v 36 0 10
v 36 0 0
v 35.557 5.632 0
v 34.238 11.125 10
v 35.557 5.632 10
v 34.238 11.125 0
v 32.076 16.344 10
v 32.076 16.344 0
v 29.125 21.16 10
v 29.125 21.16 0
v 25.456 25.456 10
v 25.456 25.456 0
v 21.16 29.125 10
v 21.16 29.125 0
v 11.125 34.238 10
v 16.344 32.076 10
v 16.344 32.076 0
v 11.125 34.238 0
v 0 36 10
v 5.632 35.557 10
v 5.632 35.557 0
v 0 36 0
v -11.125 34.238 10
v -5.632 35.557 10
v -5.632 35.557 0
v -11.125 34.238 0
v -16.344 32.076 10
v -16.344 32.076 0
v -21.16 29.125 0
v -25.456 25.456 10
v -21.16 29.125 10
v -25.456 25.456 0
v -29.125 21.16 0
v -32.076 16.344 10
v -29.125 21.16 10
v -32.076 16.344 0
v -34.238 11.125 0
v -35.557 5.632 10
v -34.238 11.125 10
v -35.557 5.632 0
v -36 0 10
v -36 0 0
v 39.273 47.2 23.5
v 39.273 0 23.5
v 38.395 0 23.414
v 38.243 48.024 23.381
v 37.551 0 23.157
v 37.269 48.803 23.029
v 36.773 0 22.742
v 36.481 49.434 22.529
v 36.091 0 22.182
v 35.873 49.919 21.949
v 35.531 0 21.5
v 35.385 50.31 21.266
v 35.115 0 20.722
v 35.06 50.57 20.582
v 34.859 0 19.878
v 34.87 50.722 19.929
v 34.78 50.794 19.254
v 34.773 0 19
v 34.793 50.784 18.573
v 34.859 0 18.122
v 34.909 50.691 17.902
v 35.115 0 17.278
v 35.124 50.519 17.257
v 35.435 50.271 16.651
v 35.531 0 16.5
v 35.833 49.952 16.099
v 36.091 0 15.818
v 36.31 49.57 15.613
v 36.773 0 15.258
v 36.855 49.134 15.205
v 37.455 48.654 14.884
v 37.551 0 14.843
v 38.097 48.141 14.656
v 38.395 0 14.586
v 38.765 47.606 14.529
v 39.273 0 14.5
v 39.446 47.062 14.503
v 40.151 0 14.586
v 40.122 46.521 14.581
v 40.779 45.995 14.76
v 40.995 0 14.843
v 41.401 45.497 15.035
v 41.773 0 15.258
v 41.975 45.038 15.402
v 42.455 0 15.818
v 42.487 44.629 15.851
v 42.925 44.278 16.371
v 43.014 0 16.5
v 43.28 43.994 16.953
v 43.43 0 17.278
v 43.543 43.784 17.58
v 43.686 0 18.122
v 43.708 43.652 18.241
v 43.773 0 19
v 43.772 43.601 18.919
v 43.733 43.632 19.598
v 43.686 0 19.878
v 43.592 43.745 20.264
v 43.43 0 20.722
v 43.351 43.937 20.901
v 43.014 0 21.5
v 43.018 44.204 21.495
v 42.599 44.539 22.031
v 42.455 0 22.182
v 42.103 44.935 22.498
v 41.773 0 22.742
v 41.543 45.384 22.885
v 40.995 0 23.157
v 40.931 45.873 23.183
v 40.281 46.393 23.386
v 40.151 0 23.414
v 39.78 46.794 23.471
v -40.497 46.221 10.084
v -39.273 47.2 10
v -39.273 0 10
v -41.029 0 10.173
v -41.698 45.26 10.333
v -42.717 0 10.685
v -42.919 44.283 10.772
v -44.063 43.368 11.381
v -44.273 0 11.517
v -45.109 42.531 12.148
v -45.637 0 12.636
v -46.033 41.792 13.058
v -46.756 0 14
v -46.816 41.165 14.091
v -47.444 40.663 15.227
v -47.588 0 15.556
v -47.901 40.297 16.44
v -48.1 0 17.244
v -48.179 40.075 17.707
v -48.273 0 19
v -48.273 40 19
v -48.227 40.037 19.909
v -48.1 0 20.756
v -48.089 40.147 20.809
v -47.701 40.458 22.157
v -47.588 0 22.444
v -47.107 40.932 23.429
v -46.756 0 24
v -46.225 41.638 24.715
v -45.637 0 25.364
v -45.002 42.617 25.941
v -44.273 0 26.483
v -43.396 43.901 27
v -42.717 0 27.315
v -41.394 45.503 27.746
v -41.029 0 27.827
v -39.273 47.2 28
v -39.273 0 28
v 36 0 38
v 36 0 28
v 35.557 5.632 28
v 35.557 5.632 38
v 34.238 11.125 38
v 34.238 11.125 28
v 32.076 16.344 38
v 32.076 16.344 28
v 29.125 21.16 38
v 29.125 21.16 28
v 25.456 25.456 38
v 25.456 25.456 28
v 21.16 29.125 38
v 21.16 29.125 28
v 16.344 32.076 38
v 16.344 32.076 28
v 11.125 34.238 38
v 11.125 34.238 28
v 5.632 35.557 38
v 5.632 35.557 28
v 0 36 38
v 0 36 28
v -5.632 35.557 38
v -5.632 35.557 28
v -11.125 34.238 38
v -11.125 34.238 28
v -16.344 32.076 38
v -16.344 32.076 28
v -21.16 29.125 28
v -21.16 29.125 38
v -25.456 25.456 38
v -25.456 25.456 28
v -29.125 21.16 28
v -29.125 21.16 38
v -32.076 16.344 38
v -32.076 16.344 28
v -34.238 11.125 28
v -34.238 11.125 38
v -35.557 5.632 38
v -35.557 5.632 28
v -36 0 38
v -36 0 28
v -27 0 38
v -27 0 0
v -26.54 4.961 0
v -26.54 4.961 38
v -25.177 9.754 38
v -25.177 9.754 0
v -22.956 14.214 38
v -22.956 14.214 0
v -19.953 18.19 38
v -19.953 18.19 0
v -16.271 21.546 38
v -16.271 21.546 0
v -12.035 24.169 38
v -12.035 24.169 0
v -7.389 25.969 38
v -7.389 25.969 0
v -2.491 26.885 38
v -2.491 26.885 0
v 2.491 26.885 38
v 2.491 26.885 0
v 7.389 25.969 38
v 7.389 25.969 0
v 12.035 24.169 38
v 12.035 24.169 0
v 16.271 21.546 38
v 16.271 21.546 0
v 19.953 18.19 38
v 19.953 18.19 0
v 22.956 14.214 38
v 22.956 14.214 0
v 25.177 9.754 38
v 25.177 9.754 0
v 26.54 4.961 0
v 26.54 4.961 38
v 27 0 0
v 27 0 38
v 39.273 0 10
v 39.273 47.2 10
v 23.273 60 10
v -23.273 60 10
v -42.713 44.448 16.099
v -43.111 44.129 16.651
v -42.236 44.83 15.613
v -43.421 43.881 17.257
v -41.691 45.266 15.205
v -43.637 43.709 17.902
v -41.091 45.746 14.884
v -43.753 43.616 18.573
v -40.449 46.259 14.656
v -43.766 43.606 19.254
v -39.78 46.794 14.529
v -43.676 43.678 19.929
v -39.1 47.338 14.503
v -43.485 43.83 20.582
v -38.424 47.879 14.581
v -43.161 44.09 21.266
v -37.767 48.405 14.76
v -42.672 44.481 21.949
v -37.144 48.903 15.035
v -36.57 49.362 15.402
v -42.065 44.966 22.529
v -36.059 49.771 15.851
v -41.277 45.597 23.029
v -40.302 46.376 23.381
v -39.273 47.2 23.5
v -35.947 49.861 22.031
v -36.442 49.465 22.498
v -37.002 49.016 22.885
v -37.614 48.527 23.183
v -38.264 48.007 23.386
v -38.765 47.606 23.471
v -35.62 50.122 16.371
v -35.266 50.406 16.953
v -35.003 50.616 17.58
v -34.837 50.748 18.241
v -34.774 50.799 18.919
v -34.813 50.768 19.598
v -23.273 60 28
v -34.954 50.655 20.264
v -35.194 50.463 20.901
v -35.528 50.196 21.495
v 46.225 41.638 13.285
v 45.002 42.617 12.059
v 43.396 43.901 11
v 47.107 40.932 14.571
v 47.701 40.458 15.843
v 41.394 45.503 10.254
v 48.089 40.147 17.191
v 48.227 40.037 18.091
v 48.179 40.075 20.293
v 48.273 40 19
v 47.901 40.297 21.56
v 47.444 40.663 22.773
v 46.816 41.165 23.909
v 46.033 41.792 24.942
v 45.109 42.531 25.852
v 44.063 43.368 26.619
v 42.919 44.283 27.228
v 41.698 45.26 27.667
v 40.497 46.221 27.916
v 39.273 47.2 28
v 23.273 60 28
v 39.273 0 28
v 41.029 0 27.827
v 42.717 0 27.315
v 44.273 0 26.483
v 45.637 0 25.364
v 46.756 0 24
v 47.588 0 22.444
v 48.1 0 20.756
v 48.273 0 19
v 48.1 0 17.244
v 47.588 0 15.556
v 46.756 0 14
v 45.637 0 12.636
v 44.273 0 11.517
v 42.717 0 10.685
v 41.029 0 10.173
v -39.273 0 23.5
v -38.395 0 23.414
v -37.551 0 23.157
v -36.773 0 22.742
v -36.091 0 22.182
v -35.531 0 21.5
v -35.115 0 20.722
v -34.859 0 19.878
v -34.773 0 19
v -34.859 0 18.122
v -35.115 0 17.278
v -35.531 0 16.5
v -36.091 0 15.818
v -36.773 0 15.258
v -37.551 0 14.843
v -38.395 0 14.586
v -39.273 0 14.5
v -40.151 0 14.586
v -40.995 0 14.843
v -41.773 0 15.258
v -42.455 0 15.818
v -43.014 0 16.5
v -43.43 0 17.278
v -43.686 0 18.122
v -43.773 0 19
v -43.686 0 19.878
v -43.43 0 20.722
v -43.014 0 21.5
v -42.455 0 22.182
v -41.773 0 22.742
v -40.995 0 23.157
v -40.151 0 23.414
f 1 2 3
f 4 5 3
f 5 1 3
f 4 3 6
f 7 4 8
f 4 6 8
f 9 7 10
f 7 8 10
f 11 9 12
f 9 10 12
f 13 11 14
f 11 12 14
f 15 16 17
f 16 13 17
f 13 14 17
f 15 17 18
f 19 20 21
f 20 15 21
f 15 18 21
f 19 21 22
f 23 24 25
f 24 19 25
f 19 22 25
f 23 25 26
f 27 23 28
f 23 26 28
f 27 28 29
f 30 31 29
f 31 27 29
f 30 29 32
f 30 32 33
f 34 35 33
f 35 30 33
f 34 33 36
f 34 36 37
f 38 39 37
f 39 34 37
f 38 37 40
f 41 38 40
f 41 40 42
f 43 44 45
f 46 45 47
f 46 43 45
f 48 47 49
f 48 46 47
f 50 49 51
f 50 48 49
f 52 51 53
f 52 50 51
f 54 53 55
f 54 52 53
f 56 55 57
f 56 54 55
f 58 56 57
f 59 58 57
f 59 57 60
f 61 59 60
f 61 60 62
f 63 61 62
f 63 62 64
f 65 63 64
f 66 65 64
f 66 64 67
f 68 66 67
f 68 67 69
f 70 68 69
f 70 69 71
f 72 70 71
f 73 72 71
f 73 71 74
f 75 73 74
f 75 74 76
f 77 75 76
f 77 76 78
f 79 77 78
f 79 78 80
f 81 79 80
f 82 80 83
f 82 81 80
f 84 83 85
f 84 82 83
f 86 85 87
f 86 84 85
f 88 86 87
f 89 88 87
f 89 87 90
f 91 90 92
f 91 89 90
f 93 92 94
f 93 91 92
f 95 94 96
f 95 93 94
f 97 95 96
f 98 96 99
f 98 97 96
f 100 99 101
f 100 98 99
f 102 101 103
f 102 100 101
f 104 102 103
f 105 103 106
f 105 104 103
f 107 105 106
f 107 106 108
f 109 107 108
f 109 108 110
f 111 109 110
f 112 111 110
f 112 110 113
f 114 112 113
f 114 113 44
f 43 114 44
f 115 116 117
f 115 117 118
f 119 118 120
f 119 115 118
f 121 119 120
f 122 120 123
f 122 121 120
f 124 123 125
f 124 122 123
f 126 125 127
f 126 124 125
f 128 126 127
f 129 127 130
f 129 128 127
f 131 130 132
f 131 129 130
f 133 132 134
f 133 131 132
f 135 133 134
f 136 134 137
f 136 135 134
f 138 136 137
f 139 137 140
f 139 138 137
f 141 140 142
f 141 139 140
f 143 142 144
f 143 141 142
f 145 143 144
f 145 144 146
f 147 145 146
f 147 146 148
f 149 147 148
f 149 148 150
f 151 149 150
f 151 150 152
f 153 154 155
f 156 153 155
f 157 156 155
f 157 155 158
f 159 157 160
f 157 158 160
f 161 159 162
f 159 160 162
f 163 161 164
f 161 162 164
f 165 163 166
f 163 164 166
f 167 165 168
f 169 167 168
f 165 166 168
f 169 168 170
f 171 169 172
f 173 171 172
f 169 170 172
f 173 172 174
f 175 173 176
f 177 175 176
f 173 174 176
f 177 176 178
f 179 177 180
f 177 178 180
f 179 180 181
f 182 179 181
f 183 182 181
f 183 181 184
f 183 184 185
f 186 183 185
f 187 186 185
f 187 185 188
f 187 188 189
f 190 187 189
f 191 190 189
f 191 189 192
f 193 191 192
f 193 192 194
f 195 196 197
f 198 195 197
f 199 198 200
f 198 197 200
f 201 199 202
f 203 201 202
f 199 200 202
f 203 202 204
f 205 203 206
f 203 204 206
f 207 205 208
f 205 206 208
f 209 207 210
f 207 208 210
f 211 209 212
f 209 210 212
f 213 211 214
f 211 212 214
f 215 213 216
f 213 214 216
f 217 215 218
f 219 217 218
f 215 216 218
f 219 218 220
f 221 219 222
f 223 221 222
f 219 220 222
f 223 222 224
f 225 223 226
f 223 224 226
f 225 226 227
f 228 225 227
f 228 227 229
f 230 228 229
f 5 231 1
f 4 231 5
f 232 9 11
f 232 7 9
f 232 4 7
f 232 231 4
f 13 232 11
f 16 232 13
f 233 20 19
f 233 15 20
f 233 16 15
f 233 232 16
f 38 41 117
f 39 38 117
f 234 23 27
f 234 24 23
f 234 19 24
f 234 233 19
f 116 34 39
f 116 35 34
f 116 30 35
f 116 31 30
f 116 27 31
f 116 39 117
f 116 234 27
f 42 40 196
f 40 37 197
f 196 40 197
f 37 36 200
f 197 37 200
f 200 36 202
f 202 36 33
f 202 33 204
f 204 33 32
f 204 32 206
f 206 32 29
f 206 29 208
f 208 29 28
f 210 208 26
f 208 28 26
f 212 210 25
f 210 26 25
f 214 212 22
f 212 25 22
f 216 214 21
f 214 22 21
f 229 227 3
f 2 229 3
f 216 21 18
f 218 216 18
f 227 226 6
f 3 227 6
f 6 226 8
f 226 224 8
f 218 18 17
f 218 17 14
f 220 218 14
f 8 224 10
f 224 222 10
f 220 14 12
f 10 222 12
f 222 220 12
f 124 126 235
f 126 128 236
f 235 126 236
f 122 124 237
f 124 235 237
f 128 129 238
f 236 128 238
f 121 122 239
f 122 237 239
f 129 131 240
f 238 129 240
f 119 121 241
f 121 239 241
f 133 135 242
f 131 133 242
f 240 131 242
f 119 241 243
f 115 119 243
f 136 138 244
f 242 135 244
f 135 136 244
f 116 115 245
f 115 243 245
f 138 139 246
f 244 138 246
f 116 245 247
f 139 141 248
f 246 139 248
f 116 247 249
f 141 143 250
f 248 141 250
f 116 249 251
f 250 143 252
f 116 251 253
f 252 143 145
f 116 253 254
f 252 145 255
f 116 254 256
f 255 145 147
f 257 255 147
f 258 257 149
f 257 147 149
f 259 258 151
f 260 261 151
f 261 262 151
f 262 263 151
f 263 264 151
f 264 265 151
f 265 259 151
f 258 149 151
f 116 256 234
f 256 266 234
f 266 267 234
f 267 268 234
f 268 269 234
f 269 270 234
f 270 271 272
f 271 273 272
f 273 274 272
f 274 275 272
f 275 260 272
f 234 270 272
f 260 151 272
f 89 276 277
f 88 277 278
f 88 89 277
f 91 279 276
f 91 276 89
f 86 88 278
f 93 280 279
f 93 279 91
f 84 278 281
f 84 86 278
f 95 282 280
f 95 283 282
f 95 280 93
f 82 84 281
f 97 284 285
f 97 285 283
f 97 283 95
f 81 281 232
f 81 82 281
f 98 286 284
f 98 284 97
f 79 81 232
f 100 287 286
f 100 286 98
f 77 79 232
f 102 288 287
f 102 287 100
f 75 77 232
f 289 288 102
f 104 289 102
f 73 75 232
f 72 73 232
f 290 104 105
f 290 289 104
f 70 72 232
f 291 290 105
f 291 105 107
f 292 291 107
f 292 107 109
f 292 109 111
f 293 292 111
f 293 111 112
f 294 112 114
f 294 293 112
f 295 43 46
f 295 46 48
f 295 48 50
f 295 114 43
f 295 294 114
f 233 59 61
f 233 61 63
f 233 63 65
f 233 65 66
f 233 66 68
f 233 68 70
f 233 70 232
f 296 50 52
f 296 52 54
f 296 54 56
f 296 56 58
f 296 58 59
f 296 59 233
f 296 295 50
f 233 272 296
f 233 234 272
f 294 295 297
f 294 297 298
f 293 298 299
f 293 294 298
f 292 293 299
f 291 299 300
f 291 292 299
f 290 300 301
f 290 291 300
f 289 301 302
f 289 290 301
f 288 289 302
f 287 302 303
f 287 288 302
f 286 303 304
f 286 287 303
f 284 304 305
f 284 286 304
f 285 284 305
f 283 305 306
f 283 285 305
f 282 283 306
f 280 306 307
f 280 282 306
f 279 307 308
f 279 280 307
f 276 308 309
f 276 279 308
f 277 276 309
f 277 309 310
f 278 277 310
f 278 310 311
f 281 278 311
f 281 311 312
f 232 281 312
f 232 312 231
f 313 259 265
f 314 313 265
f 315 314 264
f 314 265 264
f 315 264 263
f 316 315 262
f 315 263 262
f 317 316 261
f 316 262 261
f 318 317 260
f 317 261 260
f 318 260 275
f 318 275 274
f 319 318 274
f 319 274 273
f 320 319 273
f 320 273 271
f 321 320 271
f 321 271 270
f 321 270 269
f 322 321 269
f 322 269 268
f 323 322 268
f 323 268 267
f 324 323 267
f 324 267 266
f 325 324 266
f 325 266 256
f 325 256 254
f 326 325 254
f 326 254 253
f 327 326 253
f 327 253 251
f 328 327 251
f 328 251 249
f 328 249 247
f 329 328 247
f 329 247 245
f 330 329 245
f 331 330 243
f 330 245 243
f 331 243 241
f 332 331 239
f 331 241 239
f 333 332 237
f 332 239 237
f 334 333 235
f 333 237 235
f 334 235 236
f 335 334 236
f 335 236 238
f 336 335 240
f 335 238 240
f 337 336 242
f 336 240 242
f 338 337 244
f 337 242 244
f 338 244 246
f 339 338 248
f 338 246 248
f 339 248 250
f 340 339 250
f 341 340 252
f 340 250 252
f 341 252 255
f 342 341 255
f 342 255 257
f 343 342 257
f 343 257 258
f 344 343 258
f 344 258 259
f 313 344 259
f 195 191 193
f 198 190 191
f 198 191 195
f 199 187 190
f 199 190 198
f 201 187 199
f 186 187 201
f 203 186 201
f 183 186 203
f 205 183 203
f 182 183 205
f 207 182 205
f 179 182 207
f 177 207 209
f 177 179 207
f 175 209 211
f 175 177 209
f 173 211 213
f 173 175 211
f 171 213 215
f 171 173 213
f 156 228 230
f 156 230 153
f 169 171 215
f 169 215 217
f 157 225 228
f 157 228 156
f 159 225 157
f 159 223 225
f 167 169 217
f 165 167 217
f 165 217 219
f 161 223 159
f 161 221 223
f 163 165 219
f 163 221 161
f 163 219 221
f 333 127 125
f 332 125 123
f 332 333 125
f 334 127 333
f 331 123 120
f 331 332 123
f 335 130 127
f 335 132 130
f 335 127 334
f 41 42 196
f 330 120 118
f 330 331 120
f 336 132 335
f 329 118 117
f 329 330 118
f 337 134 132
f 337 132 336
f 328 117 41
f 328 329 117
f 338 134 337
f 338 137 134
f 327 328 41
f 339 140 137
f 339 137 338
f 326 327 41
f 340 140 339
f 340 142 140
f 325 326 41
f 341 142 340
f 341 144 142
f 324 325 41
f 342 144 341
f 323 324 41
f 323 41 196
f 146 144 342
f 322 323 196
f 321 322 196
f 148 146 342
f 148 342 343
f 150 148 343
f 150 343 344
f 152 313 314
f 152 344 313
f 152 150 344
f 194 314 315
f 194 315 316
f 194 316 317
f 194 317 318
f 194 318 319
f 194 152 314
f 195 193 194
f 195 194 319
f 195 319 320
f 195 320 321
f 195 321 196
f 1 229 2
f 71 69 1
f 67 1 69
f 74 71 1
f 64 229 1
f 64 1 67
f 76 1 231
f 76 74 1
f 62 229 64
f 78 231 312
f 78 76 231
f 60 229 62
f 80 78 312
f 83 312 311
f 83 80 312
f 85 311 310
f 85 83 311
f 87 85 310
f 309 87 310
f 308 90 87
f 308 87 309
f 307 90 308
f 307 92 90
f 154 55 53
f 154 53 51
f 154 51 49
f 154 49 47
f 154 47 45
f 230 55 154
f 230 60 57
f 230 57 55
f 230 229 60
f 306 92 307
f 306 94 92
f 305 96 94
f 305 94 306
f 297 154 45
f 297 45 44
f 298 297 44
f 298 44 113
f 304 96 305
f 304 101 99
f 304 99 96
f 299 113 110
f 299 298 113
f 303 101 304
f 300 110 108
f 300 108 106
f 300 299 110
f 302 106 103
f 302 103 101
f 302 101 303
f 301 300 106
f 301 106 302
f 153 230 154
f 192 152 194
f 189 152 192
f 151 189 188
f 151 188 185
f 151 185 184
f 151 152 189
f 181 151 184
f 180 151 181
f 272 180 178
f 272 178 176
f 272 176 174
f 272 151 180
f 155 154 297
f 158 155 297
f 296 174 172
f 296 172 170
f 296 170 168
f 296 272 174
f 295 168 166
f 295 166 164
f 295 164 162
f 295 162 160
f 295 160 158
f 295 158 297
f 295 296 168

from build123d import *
from build123d.topology import SkipClean

# Parameters (mm, degrees)
BOSS_EXTRUDE1_DEPTH = 38
BOSS_EXTRUDE2_REACH = 81.624
CUT_EXTRUDE1_START  = -38
SKETCH3_R           = 27
CUT_EXTRUDE1_DEPTH  = 38
SKETCH4_R           = 4.5
CUT_EXTRUDE2_DEPTH  = 64
CUT_EXTRUDE3_DEPTH  = 64


with BuildPart() as part:
    # Sketch1 → Boss-Extrude1 (new body)
    with BuildSketch(Plane.XY):
        with BuildLine():
            ThreePointArc((36, 0), (0, 36), (-36, 0))
            Line((-36, 0), (-27, 0))
            ThreePointArc((-27, 0), (0, 27), (27, 0))
            Line((27, 0), (36, 0))
        make_face()
    extrude(amount=BOSS_EXTRUDE1_DEPTH)

    # Boss-Extrude2: up to this face of the body (flat: up to its plane)
    boss_extrude2_end = Plane(part.part.faces().sort_by_distance((31.5, 0, 19))[0])
    # Sketch2 → Boss-Extrude2 (add, up to the picked face)
    with BuildSketch(Plane(origin=(0, 60, 0), x_dir=(-1, 0, 0), z_dir=(0, -1, 0)), mode=Mode.PRIVATE) as boss_extrude2_sk1:
        with BuildLine():
            Line((-39.272787465, -10), (39.272787465, -10))
            ThreePointArc((39.272787465, -10), (48.272787465, -19), (39.272787465, -28))
            Line((39.272787465, -28), (-39.272787465, -28))
            ThreePointArc((-39.272787465, -28), (-48.272787465, -19), (-39.272787465, -10))
        make_face()
    boss_extrude2_tool1 = split(extrude(boss_extrude2_sk1.sketch, amount=BOSS_EXTRUDE2_REACH, mode=Mode.PRIVATE), bisect_by=boss_extrude2_end, keep=Keep.BOTH, mode=Mode.PRIVATE)
    add(boss_extrude2_tool1.solids().sort_by(Axis((0, 60, 19), (0, -1, 0)))[0])

    # Sketch3 → Cut-Extrude1 (cut)
    with SkipClean():  # the faces are left unmerged after this step: merging them gives an invalid solid
        with BuildSketch(Plane.XY.offset(28).offset(CUT_EXTRUDE1_START)):
            Circle(SKETCH3_R)
        extrude(amount=CUT_EXTRUDE1_DEPTH, mode=Mode.SUBTRACT)
    add(part.part.scale(1), mode=Mode.REPLACE)  # the faces are merged on a copy

    # Sketch4 → Cut-Extrude2 (cut)
    with BuildSketch(Plane(origin=(0, 60, 0), x_dir=(1, 0, 0), z_dir=(0, 1, 0))):
        with Locations(Location((-39.272787465, -19, 0), (0, 0, 270))):
            Circle(SKETCH4_R)
    cut_extrude2 = extrude(amount=-CUT_EXTRUDE2_DEPTH, mode=Mode.SUBTRACT)

    # Mirror1: Cut-Extrude2 across plane
    add(cut_extrude2.mirror(Plane(origin=(0, 0, 0), x_dir=(0, 0, 1), z_dir=(1, 0, 0))), mode=Mode.SUBTRACT)

    # Sketch6 → Cut-Extrude3 (cut)
    with BuildSketch(Plane.XY.offset(28)):
        Polygon((-48.272787465, 40), (-39.272787465, 47.2), (-39.272787465, 60), (-48.272787465, 60), align=None)
        Polygon((-39.272787465, 47.2), (-23.272787465, 60), (-39.272787465, 60), align=None)
    cut_extrude3 = extrude(amount=-CUT_EXTRUDE3_DEPTH, mode=Mode.SUBTRACT)

    # Mirror2: Cut-Extrude3 across plane
    add(cut_extrude3.mirror(Plane(origin=(0, 0, 0), x_dir=(0, 0, 1), z_dir=(1, 0, 0))), mode=Mode.SUBTRACT)


solid = part.part
